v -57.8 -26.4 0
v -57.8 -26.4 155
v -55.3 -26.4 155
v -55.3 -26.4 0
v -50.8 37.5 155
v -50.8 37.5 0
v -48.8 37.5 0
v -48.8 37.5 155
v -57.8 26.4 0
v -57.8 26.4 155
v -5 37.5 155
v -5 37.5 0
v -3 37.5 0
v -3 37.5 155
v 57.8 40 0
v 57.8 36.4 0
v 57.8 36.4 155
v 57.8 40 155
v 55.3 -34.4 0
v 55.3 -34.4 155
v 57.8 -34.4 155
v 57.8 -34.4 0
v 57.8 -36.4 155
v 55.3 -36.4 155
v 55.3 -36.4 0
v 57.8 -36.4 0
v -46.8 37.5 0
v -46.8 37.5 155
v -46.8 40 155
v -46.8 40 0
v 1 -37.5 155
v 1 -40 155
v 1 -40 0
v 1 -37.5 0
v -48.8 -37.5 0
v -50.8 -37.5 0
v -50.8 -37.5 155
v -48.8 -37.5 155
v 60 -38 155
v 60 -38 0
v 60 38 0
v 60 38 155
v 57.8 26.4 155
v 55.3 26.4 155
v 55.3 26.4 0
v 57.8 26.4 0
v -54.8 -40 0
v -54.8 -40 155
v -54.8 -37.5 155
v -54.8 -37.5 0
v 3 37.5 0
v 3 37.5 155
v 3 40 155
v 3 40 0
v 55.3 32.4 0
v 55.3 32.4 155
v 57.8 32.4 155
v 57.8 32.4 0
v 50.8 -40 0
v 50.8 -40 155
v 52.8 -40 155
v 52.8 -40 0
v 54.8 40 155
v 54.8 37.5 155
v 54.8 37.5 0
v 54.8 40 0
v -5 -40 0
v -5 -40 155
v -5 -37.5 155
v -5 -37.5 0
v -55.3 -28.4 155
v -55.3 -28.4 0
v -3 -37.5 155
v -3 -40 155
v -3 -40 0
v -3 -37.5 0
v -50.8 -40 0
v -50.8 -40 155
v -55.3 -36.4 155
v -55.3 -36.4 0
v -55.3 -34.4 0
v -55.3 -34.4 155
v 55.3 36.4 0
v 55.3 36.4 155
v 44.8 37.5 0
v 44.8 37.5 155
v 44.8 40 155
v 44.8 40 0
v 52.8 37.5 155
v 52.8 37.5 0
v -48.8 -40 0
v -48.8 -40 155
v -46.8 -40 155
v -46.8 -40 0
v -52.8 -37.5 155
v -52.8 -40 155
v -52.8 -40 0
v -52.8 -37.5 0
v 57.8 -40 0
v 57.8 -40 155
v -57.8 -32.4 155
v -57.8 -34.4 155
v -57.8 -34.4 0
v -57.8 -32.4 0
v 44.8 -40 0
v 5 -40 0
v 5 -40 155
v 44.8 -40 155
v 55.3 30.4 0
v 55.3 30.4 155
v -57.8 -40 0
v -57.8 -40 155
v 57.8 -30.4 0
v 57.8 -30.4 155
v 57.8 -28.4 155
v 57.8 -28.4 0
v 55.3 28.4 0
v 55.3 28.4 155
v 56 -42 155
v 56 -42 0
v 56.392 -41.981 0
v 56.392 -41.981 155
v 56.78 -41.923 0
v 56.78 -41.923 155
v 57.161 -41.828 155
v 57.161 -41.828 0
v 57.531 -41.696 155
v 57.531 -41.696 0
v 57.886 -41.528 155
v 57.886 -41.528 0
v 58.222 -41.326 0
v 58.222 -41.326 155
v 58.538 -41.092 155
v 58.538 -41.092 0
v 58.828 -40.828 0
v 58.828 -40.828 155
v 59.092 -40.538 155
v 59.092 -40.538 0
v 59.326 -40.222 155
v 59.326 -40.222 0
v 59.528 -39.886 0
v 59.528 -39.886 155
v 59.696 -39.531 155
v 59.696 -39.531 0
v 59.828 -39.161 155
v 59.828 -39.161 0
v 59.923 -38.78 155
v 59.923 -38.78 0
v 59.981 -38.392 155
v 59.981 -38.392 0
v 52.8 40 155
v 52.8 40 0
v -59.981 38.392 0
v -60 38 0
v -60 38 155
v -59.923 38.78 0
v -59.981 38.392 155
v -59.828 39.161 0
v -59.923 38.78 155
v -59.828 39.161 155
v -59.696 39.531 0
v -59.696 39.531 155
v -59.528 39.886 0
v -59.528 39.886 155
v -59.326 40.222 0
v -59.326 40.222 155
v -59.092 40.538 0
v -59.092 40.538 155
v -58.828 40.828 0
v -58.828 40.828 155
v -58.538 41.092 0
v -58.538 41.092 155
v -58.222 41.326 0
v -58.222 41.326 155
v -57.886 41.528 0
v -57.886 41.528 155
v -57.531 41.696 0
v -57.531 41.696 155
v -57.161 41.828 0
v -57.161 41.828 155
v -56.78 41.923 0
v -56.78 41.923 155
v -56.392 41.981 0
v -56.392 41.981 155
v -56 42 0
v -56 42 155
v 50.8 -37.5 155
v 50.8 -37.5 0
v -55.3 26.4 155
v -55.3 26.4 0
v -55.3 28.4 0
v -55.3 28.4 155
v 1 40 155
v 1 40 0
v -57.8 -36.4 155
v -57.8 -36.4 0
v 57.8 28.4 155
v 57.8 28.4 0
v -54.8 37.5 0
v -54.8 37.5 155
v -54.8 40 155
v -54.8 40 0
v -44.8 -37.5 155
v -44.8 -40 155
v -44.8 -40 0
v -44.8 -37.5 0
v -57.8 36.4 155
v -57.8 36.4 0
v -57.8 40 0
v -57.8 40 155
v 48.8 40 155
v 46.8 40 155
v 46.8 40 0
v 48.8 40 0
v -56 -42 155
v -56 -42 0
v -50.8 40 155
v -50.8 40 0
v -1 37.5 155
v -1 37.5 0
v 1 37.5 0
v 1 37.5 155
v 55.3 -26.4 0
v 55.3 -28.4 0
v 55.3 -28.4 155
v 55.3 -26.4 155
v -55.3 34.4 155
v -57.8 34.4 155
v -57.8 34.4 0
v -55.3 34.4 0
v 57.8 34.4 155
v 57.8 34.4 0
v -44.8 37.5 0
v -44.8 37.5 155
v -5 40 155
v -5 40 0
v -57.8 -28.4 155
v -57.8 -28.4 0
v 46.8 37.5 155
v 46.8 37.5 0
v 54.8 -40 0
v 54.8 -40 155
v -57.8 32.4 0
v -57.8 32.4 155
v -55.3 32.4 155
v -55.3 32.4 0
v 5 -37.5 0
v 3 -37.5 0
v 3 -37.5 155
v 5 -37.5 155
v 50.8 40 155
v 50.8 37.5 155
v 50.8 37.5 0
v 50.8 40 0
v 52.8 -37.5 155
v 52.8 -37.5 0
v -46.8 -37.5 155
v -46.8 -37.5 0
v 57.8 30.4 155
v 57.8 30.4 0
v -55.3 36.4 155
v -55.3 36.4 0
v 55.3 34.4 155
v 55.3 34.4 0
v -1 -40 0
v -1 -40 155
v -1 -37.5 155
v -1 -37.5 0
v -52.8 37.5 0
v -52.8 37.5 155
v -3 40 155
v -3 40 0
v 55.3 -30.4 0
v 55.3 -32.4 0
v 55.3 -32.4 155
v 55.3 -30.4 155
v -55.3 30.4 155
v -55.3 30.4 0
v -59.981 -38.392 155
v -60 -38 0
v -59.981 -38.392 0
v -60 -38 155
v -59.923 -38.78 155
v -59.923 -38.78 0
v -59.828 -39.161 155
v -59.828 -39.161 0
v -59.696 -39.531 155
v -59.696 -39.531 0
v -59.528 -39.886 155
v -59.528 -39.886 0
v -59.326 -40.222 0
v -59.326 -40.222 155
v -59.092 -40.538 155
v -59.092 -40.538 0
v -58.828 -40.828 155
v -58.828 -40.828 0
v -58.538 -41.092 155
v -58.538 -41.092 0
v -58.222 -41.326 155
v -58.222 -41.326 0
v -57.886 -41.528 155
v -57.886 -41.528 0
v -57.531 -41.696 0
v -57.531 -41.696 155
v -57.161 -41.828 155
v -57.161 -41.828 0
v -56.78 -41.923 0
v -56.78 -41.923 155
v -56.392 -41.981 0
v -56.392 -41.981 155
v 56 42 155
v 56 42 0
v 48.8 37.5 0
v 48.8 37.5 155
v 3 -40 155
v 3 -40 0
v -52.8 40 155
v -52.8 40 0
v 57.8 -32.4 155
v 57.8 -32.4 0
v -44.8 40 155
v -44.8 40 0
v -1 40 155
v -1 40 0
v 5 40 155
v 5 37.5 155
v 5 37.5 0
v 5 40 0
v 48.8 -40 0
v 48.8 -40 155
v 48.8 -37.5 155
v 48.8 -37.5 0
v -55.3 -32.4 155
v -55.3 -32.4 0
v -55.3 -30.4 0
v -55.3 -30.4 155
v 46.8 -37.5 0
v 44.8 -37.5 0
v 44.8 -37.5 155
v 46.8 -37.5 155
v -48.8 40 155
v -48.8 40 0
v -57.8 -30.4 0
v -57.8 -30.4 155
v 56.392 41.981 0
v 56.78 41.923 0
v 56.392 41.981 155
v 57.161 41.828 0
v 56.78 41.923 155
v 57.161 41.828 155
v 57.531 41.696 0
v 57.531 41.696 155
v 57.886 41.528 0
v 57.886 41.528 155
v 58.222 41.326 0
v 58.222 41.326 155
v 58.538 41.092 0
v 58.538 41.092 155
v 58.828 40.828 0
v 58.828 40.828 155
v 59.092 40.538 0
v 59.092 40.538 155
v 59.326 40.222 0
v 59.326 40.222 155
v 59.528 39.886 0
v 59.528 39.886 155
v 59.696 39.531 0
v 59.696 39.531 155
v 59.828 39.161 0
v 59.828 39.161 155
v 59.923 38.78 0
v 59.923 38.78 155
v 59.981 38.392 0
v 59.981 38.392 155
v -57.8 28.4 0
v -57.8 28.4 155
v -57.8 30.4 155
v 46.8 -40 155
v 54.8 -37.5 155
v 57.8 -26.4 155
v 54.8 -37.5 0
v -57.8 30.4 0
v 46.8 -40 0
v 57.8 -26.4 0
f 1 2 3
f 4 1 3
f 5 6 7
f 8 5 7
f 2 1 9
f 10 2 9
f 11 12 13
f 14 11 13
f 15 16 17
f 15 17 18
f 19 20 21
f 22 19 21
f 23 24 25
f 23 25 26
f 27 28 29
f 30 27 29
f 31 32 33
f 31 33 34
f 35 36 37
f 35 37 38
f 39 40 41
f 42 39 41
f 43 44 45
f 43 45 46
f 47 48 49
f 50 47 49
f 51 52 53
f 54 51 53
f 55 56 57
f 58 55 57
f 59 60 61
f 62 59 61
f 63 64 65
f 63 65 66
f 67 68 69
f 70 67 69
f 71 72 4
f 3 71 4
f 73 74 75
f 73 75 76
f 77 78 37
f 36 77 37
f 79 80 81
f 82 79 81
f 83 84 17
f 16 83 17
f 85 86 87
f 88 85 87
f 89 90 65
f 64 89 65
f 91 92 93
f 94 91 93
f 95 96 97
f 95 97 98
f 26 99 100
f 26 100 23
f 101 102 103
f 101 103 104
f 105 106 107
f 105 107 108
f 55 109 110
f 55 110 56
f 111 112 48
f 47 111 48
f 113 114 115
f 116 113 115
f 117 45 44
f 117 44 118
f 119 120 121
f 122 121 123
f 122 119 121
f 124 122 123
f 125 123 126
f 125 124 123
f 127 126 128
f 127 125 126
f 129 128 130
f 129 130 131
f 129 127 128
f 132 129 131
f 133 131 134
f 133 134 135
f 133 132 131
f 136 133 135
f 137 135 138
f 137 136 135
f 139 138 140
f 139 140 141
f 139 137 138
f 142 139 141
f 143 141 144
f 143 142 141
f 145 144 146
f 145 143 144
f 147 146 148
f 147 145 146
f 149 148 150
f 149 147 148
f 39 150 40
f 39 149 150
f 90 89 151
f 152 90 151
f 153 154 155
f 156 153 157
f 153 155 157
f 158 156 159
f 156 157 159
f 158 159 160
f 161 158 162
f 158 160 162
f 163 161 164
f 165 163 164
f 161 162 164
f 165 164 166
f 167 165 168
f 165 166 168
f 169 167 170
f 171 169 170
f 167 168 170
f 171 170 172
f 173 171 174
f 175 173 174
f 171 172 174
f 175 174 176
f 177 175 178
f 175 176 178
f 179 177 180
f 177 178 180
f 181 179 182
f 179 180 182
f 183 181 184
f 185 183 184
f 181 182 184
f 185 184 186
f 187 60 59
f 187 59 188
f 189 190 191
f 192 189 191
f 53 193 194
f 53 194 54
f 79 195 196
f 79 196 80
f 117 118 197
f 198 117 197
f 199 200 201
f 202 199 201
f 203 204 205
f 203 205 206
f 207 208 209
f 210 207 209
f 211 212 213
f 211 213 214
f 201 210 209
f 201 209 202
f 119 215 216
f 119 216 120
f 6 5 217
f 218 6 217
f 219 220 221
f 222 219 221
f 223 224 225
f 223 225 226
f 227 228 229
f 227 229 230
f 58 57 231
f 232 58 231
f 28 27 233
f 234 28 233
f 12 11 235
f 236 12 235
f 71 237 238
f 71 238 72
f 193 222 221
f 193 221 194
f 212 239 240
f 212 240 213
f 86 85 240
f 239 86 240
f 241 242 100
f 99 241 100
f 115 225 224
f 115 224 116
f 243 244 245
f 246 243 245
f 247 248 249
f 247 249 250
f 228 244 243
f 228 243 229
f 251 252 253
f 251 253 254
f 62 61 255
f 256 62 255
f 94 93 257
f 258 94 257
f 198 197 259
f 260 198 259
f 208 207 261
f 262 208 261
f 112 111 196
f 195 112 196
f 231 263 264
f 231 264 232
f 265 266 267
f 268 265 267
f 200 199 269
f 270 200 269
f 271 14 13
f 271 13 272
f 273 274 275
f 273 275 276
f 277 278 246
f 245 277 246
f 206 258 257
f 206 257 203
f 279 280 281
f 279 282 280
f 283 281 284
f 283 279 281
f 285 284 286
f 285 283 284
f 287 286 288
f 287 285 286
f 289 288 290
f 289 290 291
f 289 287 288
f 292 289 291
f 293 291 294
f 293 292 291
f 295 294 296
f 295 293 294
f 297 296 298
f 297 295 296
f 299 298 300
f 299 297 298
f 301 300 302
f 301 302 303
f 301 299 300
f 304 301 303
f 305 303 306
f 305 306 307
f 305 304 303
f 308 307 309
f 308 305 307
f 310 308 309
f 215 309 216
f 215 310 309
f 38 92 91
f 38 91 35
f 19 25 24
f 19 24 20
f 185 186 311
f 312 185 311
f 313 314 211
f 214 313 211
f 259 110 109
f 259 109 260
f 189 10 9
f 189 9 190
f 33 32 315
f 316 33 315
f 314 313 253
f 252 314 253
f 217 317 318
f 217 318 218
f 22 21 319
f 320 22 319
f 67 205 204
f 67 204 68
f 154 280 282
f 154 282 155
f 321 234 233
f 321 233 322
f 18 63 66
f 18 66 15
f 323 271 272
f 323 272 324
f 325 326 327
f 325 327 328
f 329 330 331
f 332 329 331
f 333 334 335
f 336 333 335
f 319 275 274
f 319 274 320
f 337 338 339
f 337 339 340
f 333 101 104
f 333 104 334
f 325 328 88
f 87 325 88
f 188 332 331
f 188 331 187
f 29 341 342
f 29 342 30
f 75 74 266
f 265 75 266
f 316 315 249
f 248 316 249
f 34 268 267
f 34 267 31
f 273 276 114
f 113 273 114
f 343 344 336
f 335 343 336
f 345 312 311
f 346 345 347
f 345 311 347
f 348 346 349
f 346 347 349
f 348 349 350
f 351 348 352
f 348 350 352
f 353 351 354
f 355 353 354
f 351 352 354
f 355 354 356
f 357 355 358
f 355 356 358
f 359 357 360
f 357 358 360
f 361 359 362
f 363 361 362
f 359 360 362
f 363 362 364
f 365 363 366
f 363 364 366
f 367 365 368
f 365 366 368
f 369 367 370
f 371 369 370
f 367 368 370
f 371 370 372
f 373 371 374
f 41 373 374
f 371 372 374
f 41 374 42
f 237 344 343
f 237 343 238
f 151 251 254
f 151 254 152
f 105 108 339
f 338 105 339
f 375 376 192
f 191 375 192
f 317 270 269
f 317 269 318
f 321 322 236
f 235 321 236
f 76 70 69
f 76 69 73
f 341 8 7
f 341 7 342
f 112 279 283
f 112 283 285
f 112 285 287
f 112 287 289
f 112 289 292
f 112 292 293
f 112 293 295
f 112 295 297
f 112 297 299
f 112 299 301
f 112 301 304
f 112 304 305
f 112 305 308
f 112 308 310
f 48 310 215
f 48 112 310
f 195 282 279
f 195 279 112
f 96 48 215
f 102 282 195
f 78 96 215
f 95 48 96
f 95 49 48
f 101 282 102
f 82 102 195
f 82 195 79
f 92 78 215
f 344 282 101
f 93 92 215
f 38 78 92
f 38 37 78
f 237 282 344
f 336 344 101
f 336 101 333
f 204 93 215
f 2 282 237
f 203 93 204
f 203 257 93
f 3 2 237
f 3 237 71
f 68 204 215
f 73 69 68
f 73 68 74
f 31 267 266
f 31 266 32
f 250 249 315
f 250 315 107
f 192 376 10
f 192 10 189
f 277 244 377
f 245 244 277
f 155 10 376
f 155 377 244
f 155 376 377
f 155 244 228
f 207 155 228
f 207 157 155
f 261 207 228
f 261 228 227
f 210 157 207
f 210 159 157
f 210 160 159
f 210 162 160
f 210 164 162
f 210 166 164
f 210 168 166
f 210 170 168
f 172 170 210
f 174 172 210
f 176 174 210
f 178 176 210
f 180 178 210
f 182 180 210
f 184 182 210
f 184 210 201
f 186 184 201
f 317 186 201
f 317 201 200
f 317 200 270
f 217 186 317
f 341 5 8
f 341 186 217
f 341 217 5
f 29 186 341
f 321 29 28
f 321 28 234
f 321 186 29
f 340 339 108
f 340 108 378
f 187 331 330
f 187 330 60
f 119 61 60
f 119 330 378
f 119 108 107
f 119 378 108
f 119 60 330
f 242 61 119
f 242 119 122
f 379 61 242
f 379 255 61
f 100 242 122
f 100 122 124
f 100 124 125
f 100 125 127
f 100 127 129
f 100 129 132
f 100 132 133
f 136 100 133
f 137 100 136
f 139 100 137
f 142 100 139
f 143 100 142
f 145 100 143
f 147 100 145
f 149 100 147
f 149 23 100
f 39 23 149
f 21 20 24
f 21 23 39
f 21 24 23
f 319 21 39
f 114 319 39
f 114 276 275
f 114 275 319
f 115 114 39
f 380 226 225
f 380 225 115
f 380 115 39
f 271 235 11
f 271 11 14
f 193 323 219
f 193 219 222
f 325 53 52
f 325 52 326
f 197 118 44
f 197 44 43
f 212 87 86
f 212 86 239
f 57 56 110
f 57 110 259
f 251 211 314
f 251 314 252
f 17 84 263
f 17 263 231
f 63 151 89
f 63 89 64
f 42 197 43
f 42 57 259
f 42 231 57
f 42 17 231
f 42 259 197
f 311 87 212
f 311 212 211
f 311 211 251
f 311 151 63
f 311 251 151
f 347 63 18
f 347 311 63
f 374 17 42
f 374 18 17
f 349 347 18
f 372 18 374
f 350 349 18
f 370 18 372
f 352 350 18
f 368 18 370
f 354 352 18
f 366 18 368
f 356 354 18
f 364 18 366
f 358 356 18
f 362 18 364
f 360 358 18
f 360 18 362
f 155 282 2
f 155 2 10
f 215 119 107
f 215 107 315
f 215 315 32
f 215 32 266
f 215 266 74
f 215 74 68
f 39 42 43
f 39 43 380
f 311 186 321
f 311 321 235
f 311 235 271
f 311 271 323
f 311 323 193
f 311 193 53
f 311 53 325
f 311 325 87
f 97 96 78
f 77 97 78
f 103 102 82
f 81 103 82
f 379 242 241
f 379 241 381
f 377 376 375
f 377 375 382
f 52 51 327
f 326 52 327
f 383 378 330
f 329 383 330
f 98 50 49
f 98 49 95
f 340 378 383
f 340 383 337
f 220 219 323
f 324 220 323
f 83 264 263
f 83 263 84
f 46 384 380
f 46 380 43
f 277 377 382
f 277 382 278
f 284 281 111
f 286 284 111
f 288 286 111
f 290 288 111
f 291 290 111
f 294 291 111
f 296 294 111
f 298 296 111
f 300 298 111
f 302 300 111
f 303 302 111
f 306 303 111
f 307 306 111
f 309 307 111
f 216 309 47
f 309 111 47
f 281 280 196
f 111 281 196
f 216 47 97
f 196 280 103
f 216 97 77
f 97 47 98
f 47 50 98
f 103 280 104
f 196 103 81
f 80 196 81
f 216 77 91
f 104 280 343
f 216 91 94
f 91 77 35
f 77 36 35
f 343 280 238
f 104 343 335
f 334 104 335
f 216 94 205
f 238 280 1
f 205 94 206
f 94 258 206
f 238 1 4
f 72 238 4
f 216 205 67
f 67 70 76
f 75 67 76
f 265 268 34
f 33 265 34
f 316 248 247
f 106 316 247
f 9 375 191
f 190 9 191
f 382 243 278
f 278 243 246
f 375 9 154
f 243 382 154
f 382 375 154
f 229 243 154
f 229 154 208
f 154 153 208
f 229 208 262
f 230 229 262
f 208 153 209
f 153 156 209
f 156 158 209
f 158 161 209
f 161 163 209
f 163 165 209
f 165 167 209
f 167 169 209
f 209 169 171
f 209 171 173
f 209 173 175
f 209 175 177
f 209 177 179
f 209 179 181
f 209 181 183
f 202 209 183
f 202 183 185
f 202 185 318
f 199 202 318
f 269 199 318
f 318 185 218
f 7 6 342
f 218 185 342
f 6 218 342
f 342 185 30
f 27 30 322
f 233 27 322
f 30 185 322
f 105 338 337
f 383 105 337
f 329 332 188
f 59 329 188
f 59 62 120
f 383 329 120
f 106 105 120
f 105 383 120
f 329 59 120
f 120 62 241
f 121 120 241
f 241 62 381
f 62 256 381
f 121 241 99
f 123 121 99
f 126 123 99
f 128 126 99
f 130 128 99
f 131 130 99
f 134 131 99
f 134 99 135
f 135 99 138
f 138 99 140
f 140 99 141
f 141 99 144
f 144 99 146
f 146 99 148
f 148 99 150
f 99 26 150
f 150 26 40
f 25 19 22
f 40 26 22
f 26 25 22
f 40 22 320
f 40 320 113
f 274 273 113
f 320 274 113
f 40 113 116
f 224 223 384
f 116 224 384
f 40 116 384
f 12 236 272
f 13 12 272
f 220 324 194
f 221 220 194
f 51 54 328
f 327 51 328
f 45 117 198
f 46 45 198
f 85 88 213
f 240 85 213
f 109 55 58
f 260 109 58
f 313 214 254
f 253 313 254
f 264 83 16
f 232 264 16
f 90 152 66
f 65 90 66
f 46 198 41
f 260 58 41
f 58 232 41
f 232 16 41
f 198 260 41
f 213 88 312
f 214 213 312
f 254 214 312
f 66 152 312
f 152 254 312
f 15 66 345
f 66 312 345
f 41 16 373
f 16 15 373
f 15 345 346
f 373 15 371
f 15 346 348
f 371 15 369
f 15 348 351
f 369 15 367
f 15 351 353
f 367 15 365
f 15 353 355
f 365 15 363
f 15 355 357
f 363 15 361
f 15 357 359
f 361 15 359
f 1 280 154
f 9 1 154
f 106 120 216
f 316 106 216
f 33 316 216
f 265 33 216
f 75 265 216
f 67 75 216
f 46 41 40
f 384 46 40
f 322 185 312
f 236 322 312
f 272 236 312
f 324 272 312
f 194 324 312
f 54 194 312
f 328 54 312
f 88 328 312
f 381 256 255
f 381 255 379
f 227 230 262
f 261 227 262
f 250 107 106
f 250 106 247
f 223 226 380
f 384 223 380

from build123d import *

# Parameters (mm, degrees)
SKETCH1_W           = 120
SKETCH1_H           = 84
SKETCH1_W_2         = 115.6
SKETCH1_H_2         = 80
BOSS_EXTRUDE1_DEPTH = 155
FILLET1_R           = 4
SKETCH3_W           = 2
SKETCH3_H           = 2.5
SKETCH3_W_2         = 2.5
SKETCH3_H_2         = 2
FINALBOX_DEPTH      = 155


with BuildPart() as part:
    # Sketch1 → Boss-Extrude1 (new body)
    with BuildSketch(Plane.XY):
        Rectangle(SKETCH1_W, SKETCH1_H)
        Rectangle(SKETCH1_W_2, SKETCH1_H_2, mode=Mode.SUBTRACT)
    extrude(amount=BOSS_EXTRUDE1_DEPTH)

    # Fillet1
    fillet1_edges = [part.edges().sort_by_distance(p)[0] for p in [
        (60, -42, 77.5),
        (-60, -42, 77.5),
        (-60, 42, 77.5),
        (60, 42, 77.5),
    ]]
    fillet(fillet1_edges, radius=FILLET1_R)

    # Sketch3 → FinalBox (add, through all)
    with BuildSketch(Plane.XY.offset(155)):
        with Locations((-53.8, 38.75)):
            Rectangle(SKETCH3_W, SKETCH3_H)
        with Locations((-49.8, 38.75)):
            Rectangle(SKETCH3_W, SKETCH3_H)
        with Locations((-45.8, 38.75)):
            Rectangle(SKETCH3_W, SKETCH3_H)
        with Locations((-56.55, 35.4)):
            Rectangle(SKETCH3_W_2, SKETCH3_H_2)
        with Locations((-56.55, 31.4)):
            Rectangle(SKETCH3_W_2, SKETCH3_H_2)
        with Locations((-56.55, 27.4)):
            Rectangle(SKETCH3_W_2, SKETCH3_H_2)
        with Locations((56.55, 27.4)):
            Rectangle(SKETCH3_W_2, SKETCH3_H_2)
        with Locations((56.55, 31.4)):
            Rectangle(SKETCH3_W_2, SKETCH3_H_2)
        with Locations((56.55, 35.4)):
            Rectangle(SKETCH3_W_2, SKETCH3_H_2)
        with Locations((53.8, 38.75)):
            Rectangle(SKETCH3_W, SKETCH3_H)
        with Locations((49.8, 38.75)):
            Rectangle(SKETCH3_W, SKETCH3_H)
        with Locations((45.8, 38.75)):
            Rectangle(SKETCH3_W, SKETCH3_H)
        with Locations((45.8, -38.75)):
            Rectangle(SKETCH3_W, SKETCH3_H)
        with Locations((49.8, -38.75)):
            Rectangle(SKETCH3_W, SKETCH3_H)
        with Locations((53.8, -38.75)):
            Rectangle(SKETCH3_W, SKETCH3_H)
        with Locations((56.55, -35.4)):
            Rectangle(SKETCH3_W_2, SKETCH3_H_2)
        with Locations((56.55, -31.4)):
            Rectangle(SKETCH3_W_2, SKETCH3_H_2)
        with Locations((56.55, -27.4)):
            Rectangle(SKETCH3_W_2, SKETCH3_H_2)
        with Locations((-45.8, -38.75)):
            Rectangle(SKETCH3_W, SKETCH3_H)
        with Locations((-49.8, -38.75)):
            Rectangle(SKETCH3_W, SKETCH3_H)
        with Locations((-53.8, -38.75)):
            Rectangle(SKETCH3_W, SKETCH3_H)
        with Locations((-56.55, -35.4)):
            Rectangle(SKETCH3_W_2, SKETCH3_H_2)
        with Locations((-56.55, -31.4)):
            Rectangle(SKETCH3_W_2, SKETCH3_H_2)
        with Locations((-56.55, -27.4)):
            Rectangle(SKETCH3_W_2, SKETCH3_H_2)
        with Locations((-4, -38.75)):
            Rectangle(SKETCH3_W, SKETCH3_H)
        with Locations((-4, 38.75)):
            Rectangle(SKETCH3_W, SKETCH3_H)
        with Locations((0, 38.75)):
            Rectangle(SKETCH3_W, SKETCH3_H)
        with Locations((4, 38.75)):
            Rectangle(SKETCH3_W, SKETCH3_H)
        with Locations((0, -38.75)):
            Rectangle(SKETCH3_W, SKETCH3_H)
        with Locations((4, -38.75)):
            Rectangle(SKETCH3_W, SKETCH3_H)
    extrude(amount=-FINALBOX_DEPTH)


solid = part.part
